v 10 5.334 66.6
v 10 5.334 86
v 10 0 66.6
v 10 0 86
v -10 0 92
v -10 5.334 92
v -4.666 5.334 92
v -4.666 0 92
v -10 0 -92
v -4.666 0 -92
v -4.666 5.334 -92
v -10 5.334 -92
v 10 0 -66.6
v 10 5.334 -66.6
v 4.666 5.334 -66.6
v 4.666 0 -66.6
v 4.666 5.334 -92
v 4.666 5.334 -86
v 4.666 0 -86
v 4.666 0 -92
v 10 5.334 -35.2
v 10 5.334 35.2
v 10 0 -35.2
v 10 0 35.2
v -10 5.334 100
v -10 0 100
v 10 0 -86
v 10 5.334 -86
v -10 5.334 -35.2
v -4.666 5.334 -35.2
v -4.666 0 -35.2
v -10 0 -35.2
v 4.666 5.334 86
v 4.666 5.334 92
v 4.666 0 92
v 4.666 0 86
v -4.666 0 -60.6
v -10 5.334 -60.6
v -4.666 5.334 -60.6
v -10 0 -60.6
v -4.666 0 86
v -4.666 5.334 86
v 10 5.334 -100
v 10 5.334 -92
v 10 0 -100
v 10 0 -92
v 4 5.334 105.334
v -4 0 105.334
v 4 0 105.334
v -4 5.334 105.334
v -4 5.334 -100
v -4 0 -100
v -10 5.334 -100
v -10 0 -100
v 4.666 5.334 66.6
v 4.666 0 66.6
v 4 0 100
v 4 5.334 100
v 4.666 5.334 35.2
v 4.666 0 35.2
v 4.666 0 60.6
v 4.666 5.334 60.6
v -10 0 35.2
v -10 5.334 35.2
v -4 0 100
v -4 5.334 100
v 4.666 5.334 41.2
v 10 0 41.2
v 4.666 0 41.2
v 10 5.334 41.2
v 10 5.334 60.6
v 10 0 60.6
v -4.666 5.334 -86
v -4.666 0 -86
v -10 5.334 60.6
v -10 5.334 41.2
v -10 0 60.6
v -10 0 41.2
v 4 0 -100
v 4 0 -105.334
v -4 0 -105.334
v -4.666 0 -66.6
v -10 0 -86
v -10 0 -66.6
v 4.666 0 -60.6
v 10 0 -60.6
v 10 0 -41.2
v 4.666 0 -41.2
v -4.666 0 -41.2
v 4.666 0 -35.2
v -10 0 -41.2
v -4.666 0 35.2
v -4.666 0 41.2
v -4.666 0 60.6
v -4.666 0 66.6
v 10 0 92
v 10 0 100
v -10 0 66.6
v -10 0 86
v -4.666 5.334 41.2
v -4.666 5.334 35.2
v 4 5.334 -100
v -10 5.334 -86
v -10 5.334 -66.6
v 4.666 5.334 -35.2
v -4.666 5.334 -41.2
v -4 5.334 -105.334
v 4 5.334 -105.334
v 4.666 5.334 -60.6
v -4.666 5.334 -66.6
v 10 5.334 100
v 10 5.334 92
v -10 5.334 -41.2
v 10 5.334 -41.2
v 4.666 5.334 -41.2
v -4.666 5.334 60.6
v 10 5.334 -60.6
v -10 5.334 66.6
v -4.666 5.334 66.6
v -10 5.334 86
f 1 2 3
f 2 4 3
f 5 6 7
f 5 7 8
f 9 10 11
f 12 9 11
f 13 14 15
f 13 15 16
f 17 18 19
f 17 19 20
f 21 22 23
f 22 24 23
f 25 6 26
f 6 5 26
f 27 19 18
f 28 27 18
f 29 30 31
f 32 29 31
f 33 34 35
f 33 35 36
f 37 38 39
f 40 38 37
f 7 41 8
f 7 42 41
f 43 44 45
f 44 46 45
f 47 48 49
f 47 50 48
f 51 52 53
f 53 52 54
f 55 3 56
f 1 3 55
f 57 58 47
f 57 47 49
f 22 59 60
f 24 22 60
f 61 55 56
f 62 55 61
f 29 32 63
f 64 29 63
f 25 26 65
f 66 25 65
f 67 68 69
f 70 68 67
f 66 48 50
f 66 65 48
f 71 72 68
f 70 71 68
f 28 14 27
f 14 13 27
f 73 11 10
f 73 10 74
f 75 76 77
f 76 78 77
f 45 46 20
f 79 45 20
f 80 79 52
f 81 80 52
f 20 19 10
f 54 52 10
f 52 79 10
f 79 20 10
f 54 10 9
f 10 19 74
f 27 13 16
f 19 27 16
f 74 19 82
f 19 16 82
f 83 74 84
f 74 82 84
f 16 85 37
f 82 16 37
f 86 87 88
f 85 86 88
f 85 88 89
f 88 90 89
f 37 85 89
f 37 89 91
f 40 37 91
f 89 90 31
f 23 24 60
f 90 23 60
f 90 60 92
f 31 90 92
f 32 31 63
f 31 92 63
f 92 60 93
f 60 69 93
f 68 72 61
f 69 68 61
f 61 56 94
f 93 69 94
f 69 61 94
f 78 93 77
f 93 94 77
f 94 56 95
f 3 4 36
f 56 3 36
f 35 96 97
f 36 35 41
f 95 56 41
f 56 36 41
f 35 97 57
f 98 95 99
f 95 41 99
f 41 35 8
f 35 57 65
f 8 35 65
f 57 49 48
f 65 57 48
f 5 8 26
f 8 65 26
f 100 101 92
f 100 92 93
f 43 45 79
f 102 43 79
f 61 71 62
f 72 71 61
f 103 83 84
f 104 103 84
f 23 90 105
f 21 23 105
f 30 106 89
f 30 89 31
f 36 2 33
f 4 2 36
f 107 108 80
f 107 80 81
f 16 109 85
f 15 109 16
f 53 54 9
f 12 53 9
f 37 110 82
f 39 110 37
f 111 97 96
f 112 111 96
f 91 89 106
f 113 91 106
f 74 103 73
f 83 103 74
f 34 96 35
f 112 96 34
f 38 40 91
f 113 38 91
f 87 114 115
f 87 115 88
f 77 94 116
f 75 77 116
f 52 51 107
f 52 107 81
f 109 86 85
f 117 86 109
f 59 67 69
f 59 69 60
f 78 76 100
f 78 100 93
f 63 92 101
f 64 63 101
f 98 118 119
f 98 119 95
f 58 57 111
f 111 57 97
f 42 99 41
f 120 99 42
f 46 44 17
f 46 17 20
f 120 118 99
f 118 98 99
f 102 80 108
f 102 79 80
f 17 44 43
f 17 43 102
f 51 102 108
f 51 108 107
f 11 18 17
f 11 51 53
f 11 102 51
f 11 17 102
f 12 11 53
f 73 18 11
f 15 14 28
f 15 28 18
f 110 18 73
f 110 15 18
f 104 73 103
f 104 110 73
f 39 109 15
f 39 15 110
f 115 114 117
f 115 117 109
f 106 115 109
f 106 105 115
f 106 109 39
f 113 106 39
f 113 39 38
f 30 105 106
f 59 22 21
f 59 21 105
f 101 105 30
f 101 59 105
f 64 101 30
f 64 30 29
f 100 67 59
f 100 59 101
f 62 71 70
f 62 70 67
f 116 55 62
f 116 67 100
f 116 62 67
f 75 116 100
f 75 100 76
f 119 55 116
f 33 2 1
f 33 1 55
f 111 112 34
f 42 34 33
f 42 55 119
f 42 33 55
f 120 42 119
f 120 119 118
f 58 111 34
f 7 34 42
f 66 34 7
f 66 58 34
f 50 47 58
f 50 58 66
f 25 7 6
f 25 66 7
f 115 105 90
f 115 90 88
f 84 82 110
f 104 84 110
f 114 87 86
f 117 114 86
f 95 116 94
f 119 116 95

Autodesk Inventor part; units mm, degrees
ref_plane "YZ Plane" through (0, 0, 0) normal (1, 0, 0) x (0, 1, 0)
ref_plane "XZ Plane" through (0, 0, 0) normal (0, 1, 0) x (-1, 0, 0)
ref_plane "XY Plane" through (0, 0, 0) normal (0, 0, 1) x (1, 0, 0)
sketch "Sketch1" plane through (0, 0, 0) normal (0, 1, 0) x (-1, 0, 0)
  line L0 (10, 100) -> (-10, 100)
  line L1 (-10, 100) -> (-10, -100)
  line L2 (-10, -100) -> (10, -100)
  line L3 (10, -100) -> (10, 100)
  point P0 (0, 0)
  point P1 (10, 0)
  point P2 (0, 100)
  dimension "d0" = 20
  dimension "d1" = 200
extrude "Extrusion1" add sketch "Sketch1" along normal blind 5.334
sketch "Sketch2" plane through (-10, 0, 100) normal (0, 0, 1) x (1, 0, 0)
  line L0 (0, 5.334) -> (20, 5.334) projected
  line L1 (6, 5.334) -> (14, 5.334)
  line L2 (14, 5.334) -> (14, 0)
  line L3 (14, 0) -> (6, 0)
  line L4 (6, 0) -> (6, 5.334)
  line L5 (0, 0) -> (20, 0) projected
  point P0 (10, 0)
  point P1 (10, 0)
  dimension "d4" = 8
  dimension "d5" = 4
extrude "Extrusion2" add sketch "Sketch2" along normal blind 5.334
mirror "Mirror1" about plane through (0, 0, 0) normal (0, 0, 1) of "Extrusion2"
sketch "Sketch3" plane through (10, 0, 100) normal (1, 0, 0) x (0, 0, -1)
  line L0 (0, 5.334) -> (200, 5.334) projected
  line L1 (0, 0) -> (200, 0) projected
  line L2 (8, 5.334) -> (14, 5.334)
  line L3 (14, 5.334) -> (14, 0)
  line L4 (14, 0) -> (8, 0)
  line L5 (8, 0) -> (8, 5.334)
  line L6 (0, 0) -> (0, 5.334) projected
  point P0 (100, 0)
  dimension "d8" = 6
  dimension "d9" = 8
extrude "Extrusion3" cut sketch "Sketch3" against normal blind 5.334 contours L0 L3 L1 L5
pattern_linear "Rectangular Pattern1" count 3 spacing 25.4 along (0, 0, -1) of "Extrusion3"
mirror "Mirror2" about plane through (0, 0, 0) normal (0, 0, 1) of "Extrusion3", "Rectangular Pattern1"
mirror "Mirror3" about plane through (0, 0, 0) normal (1, 0, 0) of "Extrusion3", "Rectangular Pattern1", "Mirror2"
equation "\"d5\" = 0.5 * d4"
properties part number "base"
